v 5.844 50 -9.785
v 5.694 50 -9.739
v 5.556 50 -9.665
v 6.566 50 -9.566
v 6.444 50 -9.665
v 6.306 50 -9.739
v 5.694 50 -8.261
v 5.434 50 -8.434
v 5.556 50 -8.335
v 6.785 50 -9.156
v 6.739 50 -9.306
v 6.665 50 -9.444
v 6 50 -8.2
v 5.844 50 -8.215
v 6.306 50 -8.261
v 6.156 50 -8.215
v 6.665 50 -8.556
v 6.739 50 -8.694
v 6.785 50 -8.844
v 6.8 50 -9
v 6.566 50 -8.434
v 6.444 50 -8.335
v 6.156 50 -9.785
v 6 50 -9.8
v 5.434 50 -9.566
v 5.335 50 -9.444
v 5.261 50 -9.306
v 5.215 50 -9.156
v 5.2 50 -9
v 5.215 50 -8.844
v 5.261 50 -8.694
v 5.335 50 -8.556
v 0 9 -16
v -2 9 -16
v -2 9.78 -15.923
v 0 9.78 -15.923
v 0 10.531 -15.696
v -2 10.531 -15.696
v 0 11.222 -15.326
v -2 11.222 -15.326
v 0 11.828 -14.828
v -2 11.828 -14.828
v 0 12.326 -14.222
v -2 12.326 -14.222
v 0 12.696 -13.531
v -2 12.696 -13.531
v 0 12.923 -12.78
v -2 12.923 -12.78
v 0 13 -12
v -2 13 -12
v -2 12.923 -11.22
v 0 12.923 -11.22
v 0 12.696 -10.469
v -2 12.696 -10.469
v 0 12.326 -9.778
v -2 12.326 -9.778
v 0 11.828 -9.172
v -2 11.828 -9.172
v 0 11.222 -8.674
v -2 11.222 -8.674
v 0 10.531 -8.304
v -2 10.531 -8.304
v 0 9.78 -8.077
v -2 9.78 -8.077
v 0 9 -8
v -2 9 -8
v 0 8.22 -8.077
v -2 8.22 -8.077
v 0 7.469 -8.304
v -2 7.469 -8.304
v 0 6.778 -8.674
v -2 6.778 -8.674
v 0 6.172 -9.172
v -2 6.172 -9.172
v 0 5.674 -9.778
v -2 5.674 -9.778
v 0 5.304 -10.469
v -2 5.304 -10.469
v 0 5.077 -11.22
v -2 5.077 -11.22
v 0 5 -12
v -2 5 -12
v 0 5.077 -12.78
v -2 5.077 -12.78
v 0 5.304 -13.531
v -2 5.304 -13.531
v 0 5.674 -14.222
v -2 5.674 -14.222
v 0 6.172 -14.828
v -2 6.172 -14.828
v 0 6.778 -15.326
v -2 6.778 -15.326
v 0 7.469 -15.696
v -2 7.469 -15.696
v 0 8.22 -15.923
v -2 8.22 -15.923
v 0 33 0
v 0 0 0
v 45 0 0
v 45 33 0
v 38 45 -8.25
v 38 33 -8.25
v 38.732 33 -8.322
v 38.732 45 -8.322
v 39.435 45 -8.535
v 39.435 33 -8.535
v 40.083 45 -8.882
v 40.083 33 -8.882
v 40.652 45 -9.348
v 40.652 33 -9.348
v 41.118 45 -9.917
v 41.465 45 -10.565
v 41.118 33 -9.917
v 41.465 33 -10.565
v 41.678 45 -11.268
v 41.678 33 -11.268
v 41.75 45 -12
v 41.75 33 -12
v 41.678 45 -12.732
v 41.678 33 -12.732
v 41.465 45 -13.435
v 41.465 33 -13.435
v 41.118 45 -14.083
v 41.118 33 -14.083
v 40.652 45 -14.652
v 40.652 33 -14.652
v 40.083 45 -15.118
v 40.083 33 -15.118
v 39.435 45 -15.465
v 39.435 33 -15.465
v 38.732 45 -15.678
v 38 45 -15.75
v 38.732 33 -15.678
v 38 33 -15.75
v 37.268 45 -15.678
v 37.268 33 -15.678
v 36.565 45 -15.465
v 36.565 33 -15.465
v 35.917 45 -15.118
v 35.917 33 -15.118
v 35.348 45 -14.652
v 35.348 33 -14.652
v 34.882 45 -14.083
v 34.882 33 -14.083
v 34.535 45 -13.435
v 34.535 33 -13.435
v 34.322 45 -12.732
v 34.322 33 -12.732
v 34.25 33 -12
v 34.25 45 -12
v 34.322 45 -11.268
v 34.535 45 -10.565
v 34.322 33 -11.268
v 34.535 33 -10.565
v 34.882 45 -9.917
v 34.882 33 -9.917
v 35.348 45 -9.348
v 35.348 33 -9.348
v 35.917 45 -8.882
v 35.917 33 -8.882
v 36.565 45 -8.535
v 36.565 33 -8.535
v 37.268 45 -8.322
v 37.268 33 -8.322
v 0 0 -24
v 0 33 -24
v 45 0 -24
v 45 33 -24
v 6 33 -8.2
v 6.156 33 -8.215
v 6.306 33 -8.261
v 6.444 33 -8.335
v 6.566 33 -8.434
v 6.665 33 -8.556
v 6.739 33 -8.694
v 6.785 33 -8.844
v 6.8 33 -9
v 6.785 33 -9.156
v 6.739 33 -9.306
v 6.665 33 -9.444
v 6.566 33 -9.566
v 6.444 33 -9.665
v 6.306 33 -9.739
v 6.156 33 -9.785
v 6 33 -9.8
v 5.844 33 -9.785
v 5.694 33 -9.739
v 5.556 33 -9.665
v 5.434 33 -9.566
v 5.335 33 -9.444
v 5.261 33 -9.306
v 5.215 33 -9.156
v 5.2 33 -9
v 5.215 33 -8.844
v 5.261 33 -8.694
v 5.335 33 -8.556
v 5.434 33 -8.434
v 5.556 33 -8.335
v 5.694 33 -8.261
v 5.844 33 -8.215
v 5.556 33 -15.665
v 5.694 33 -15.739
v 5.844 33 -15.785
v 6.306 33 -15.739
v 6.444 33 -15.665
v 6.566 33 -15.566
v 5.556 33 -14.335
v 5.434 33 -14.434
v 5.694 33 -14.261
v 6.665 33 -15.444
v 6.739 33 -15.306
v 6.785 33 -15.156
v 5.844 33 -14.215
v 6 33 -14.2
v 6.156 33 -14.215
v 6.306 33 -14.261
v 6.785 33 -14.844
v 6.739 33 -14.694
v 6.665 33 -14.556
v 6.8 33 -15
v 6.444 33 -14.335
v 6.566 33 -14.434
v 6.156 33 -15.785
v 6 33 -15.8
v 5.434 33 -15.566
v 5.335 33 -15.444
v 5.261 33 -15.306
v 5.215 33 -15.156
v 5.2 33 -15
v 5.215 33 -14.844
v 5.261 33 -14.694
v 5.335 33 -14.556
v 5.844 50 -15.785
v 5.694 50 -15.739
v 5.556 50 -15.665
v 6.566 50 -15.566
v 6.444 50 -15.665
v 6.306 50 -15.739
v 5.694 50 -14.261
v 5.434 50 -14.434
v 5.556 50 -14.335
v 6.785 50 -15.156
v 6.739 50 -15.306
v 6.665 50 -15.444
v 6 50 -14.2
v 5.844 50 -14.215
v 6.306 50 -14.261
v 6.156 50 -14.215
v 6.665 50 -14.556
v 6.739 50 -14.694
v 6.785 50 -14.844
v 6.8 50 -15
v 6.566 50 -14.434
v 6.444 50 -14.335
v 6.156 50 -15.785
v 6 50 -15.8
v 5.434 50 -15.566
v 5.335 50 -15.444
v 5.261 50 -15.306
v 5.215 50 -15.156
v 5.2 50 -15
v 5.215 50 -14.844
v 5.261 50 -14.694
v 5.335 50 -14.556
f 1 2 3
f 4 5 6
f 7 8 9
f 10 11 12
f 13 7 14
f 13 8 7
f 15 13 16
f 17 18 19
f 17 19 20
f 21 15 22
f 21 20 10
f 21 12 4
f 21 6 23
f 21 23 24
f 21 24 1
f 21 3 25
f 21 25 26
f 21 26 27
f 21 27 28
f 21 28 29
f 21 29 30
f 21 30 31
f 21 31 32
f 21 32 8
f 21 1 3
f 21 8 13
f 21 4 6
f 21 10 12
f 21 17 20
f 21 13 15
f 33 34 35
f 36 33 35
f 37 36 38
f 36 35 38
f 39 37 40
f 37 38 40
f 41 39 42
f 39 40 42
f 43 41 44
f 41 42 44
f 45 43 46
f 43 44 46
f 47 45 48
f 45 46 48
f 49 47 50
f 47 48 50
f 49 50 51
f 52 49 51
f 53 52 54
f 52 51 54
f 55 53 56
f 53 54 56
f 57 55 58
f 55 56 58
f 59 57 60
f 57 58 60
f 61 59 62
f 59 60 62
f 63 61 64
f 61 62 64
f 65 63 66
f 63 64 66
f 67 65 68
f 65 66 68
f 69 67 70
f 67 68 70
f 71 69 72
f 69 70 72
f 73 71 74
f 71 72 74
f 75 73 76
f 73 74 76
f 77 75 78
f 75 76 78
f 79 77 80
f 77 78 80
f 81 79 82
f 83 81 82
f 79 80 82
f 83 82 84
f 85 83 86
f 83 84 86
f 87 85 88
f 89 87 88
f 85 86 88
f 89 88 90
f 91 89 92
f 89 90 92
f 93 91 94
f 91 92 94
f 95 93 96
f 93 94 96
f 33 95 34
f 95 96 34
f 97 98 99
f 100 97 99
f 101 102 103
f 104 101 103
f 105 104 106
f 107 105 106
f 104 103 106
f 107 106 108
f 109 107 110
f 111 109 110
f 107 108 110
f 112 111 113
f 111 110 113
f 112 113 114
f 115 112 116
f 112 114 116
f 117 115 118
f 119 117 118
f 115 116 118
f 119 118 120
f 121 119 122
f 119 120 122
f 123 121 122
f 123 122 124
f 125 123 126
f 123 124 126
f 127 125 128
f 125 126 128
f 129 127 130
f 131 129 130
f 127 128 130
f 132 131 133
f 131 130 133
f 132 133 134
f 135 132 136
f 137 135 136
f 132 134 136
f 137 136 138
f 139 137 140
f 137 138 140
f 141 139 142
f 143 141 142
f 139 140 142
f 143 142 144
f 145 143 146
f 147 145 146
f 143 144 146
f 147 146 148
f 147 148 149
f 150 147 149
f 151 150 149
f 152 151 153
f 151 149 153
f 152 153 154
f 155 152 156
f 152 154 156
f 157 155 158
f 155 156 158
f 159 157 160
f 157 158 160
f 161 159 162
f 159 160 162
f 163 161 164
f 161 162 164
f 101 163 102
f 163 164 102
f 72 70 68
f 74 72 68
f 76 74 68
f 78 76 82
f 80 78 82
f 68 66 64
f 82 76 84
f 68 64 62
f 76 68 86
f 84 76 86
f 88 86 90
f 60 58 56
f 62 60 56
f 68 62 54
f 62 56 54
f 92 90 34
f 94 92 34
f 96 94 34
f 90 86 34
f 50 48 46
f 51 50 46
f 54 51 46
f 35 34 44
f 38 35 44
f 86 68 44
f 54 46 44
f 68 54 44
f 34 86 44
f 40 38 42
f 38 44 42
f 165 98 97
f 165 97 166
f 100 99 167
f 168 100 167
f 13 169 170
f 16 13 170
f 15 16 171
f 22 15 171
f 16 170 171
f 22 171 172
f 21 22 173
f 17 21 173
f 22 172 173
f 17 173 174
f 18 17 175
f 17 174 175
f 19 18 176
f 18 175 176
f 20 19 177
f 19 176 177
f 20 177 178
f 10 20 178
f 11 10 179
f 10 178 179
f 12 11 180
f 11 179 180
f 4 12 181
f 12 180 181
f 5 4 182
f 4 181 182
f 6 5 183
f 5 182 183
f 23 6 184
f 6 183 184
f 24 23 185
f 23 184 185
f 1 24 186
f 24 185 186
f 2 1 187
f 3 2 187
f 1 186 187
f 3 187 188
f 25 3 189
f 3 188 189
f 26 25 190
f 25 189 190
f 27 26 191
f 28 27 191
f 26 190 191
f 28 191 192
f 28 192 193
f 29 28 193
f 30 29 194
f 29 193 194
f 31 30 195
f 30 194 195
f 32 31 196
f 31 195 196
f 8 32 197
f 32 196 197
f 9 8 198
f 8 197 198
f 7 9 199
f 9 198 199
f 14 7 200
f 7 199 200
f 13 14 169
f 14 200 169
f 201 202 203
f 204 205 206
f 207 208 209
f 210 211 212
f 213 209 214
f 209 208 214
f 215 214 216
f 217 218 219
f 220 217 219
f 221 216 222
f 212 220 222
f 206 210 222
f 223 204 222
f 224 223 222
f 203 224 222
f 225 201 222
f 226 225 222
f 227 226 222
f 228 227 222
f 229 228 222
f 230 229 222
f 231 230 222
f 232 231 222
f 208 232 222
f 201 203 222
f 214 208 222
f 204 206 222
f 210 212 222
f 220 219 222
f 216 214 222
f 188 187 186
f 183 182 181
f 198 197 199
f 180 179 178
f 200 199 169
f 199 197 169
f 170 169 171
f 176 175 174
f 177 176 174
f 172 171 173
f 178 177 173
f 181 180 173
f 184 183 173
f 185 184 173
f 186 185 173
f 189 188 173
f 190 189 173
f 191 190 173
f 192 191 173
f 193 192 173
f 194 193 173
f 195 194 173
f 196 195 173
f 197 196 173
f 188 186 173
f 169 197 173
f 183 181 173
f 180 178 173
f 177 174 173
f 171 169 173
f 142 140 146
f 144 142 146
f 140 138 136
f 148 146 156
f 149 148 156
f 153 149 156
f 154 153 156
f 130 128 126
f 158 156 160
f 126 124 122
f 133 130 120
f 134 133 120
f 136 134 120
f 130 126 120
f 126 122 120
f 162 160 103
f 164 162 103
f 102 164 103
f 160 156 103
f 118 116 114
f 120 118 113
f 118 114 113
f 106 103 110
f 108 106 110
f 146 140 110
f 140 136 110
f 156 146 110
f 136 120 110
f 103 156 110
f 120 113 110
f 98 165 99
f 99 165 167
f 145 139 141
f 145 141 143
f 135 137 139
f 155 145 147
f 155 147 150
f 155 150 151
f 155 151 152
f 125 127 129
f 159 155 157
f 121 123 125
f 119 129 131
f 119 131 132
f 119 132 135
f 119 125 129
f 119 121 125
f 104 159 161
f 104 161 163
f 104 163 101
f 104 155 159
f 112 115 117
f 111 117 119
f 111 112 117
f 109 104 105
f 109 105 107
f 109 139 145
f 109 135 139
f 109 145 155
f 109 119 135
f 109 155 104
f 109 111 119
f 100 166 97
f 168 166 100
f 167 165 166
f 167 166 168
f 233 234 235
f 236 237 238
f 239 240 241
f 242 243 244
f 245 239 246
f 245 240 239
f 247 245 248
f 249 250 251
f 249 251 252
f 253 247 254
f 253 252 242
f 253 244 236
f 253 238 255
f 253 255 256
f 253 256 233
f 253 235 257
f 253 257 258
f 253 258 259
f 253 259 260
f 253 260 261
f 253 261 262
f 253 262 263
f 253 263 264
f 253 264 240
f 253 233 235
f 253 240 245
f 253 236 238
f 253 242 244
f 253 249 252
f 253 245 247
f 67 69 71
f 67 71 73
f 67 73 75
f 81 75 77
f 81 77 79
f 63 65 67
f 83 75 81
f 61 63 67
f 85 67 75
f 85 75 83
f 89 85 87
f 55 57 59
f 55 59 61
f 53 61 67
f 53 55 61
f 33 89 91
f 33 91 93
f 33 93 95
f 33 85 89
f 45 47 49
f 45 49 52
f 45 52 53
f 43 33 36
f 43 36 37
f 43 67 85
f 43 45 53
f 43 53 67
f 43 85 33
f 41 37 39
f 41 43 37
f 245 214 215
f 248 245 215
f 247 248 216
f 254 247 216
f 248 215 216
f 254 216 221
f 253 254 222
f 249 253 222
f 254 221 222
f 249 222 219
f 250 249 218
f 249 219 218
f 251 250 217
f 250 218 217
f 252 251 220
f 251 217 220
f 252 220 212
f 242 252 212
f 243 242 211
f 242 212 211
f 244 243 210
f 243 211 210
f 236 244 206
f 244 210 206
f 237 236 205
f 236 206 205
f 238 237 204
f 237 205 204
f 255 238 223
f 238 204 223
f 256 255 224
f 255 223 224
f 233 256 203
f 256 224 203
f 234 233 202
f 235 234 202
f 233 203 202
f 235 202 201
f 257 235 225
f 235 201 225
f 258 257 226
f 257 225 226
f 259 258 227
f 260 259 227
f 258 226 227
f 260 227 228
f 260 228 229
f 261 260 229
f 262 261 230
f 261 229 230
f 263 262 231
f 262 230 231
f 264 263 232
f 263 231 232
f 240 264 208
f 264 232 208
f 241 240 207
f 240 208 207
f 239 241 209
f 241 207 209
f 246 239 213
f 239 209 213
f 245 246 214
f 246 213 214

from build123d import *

# Parameters (mm, degrees)
SK_PUMP_BODY_W      = 45
SK_PUMP_BODY_H      = 24
PUMP_BODY_DEPTH     = 33
OUTLET_START        = 33
SK_OUTLET_NOZZLE_R  = 3.75
OUTLET_NOZZLE_DEPTH = 12
INLET_START         = -2
SK_INLET_R          = 4
INLET_DEPTH         = 2
LEAD_START          = 33
SK_LEAD_RED_R       = 0.8
LEAD_RED_DEPTH      = 17
SK_LEAD_BLACK_R     = 0.8
LEAD_BLACK_DEPTH    = 17


with BuildPart() as part:
    # SK Pump body → Pump body (new body)
    with BuildSketch(Plane(origin=(0, 0, 0), x_dir=(1, 0, 0), z_dir=(0, 1, 0))):
        with Locations((22.5, 12)):
            Rectangle(SK_PUMP_BODY_W, SK_PUMP_BODY_H)
    extrude(amount=PUMP_BODY_DEPTH)


with BuildPart() as body_2:
    # SK Outlet nozzle → Outlet nozzle (new body)
    with BuildSketch(Plane(origin=(0, 0, 0), x_dir=(1, 0, 0), z_dir=(0, 1, 0)).offset(OUTLET_START)):
        with Locations(Location((38, 12, 0), (0, 0, 270))):
            Circle(SK_OUTLET_NOZZLE_R)
    extrude(amount=OUTLET_NOZZLE_DEPTH)


with BuildPart() as body_3:
    # SK Inlet → Inlet (new body)
    with BuildSketch(Plane(origin=(0, 0, 0), x_dir=(0, 0, -1), z_dir=(1, 0, 0)).offset(INLET_START)):
        with Locations((12, 9)):
            Circle(SK_INLET_R)
    extrude(amount=INLET_DEPTH)


with BuildPart() as body_4:
    # SK Lead red → Lead red (new body)
    with BuildSketch(Plane(origin=(0, 0, 0), x_dir=(1, 0, 0), z_dir=(0, 1, 0)).offset(LEAD_START)):
        with Locations(Location((6, 9, 0), (0, 0, 270))):
            Circle(SK_LEAD_RED_R)
    extrude(amount=LEAD_RED_DEPTH)


with BuildPart() as body_5:
    # SK Lead black → Lead black (new body)
    with BuildSketch(Plane(origin=(0, 0, 0), x_dir=(1, 0, 0), z_dir=(0, 1, 0)).offset(LEAD_START)):
        with Locations(Location((6, 15, 0), (0, 0, 270))):
            Circle(SK_LEAD_BLACK_R)
    extrude(amount=LEAD_BLACK_DEPTH)


solid = Compound([part.part, body_2.part, body_3.part, body_4.part, body_5.part])
